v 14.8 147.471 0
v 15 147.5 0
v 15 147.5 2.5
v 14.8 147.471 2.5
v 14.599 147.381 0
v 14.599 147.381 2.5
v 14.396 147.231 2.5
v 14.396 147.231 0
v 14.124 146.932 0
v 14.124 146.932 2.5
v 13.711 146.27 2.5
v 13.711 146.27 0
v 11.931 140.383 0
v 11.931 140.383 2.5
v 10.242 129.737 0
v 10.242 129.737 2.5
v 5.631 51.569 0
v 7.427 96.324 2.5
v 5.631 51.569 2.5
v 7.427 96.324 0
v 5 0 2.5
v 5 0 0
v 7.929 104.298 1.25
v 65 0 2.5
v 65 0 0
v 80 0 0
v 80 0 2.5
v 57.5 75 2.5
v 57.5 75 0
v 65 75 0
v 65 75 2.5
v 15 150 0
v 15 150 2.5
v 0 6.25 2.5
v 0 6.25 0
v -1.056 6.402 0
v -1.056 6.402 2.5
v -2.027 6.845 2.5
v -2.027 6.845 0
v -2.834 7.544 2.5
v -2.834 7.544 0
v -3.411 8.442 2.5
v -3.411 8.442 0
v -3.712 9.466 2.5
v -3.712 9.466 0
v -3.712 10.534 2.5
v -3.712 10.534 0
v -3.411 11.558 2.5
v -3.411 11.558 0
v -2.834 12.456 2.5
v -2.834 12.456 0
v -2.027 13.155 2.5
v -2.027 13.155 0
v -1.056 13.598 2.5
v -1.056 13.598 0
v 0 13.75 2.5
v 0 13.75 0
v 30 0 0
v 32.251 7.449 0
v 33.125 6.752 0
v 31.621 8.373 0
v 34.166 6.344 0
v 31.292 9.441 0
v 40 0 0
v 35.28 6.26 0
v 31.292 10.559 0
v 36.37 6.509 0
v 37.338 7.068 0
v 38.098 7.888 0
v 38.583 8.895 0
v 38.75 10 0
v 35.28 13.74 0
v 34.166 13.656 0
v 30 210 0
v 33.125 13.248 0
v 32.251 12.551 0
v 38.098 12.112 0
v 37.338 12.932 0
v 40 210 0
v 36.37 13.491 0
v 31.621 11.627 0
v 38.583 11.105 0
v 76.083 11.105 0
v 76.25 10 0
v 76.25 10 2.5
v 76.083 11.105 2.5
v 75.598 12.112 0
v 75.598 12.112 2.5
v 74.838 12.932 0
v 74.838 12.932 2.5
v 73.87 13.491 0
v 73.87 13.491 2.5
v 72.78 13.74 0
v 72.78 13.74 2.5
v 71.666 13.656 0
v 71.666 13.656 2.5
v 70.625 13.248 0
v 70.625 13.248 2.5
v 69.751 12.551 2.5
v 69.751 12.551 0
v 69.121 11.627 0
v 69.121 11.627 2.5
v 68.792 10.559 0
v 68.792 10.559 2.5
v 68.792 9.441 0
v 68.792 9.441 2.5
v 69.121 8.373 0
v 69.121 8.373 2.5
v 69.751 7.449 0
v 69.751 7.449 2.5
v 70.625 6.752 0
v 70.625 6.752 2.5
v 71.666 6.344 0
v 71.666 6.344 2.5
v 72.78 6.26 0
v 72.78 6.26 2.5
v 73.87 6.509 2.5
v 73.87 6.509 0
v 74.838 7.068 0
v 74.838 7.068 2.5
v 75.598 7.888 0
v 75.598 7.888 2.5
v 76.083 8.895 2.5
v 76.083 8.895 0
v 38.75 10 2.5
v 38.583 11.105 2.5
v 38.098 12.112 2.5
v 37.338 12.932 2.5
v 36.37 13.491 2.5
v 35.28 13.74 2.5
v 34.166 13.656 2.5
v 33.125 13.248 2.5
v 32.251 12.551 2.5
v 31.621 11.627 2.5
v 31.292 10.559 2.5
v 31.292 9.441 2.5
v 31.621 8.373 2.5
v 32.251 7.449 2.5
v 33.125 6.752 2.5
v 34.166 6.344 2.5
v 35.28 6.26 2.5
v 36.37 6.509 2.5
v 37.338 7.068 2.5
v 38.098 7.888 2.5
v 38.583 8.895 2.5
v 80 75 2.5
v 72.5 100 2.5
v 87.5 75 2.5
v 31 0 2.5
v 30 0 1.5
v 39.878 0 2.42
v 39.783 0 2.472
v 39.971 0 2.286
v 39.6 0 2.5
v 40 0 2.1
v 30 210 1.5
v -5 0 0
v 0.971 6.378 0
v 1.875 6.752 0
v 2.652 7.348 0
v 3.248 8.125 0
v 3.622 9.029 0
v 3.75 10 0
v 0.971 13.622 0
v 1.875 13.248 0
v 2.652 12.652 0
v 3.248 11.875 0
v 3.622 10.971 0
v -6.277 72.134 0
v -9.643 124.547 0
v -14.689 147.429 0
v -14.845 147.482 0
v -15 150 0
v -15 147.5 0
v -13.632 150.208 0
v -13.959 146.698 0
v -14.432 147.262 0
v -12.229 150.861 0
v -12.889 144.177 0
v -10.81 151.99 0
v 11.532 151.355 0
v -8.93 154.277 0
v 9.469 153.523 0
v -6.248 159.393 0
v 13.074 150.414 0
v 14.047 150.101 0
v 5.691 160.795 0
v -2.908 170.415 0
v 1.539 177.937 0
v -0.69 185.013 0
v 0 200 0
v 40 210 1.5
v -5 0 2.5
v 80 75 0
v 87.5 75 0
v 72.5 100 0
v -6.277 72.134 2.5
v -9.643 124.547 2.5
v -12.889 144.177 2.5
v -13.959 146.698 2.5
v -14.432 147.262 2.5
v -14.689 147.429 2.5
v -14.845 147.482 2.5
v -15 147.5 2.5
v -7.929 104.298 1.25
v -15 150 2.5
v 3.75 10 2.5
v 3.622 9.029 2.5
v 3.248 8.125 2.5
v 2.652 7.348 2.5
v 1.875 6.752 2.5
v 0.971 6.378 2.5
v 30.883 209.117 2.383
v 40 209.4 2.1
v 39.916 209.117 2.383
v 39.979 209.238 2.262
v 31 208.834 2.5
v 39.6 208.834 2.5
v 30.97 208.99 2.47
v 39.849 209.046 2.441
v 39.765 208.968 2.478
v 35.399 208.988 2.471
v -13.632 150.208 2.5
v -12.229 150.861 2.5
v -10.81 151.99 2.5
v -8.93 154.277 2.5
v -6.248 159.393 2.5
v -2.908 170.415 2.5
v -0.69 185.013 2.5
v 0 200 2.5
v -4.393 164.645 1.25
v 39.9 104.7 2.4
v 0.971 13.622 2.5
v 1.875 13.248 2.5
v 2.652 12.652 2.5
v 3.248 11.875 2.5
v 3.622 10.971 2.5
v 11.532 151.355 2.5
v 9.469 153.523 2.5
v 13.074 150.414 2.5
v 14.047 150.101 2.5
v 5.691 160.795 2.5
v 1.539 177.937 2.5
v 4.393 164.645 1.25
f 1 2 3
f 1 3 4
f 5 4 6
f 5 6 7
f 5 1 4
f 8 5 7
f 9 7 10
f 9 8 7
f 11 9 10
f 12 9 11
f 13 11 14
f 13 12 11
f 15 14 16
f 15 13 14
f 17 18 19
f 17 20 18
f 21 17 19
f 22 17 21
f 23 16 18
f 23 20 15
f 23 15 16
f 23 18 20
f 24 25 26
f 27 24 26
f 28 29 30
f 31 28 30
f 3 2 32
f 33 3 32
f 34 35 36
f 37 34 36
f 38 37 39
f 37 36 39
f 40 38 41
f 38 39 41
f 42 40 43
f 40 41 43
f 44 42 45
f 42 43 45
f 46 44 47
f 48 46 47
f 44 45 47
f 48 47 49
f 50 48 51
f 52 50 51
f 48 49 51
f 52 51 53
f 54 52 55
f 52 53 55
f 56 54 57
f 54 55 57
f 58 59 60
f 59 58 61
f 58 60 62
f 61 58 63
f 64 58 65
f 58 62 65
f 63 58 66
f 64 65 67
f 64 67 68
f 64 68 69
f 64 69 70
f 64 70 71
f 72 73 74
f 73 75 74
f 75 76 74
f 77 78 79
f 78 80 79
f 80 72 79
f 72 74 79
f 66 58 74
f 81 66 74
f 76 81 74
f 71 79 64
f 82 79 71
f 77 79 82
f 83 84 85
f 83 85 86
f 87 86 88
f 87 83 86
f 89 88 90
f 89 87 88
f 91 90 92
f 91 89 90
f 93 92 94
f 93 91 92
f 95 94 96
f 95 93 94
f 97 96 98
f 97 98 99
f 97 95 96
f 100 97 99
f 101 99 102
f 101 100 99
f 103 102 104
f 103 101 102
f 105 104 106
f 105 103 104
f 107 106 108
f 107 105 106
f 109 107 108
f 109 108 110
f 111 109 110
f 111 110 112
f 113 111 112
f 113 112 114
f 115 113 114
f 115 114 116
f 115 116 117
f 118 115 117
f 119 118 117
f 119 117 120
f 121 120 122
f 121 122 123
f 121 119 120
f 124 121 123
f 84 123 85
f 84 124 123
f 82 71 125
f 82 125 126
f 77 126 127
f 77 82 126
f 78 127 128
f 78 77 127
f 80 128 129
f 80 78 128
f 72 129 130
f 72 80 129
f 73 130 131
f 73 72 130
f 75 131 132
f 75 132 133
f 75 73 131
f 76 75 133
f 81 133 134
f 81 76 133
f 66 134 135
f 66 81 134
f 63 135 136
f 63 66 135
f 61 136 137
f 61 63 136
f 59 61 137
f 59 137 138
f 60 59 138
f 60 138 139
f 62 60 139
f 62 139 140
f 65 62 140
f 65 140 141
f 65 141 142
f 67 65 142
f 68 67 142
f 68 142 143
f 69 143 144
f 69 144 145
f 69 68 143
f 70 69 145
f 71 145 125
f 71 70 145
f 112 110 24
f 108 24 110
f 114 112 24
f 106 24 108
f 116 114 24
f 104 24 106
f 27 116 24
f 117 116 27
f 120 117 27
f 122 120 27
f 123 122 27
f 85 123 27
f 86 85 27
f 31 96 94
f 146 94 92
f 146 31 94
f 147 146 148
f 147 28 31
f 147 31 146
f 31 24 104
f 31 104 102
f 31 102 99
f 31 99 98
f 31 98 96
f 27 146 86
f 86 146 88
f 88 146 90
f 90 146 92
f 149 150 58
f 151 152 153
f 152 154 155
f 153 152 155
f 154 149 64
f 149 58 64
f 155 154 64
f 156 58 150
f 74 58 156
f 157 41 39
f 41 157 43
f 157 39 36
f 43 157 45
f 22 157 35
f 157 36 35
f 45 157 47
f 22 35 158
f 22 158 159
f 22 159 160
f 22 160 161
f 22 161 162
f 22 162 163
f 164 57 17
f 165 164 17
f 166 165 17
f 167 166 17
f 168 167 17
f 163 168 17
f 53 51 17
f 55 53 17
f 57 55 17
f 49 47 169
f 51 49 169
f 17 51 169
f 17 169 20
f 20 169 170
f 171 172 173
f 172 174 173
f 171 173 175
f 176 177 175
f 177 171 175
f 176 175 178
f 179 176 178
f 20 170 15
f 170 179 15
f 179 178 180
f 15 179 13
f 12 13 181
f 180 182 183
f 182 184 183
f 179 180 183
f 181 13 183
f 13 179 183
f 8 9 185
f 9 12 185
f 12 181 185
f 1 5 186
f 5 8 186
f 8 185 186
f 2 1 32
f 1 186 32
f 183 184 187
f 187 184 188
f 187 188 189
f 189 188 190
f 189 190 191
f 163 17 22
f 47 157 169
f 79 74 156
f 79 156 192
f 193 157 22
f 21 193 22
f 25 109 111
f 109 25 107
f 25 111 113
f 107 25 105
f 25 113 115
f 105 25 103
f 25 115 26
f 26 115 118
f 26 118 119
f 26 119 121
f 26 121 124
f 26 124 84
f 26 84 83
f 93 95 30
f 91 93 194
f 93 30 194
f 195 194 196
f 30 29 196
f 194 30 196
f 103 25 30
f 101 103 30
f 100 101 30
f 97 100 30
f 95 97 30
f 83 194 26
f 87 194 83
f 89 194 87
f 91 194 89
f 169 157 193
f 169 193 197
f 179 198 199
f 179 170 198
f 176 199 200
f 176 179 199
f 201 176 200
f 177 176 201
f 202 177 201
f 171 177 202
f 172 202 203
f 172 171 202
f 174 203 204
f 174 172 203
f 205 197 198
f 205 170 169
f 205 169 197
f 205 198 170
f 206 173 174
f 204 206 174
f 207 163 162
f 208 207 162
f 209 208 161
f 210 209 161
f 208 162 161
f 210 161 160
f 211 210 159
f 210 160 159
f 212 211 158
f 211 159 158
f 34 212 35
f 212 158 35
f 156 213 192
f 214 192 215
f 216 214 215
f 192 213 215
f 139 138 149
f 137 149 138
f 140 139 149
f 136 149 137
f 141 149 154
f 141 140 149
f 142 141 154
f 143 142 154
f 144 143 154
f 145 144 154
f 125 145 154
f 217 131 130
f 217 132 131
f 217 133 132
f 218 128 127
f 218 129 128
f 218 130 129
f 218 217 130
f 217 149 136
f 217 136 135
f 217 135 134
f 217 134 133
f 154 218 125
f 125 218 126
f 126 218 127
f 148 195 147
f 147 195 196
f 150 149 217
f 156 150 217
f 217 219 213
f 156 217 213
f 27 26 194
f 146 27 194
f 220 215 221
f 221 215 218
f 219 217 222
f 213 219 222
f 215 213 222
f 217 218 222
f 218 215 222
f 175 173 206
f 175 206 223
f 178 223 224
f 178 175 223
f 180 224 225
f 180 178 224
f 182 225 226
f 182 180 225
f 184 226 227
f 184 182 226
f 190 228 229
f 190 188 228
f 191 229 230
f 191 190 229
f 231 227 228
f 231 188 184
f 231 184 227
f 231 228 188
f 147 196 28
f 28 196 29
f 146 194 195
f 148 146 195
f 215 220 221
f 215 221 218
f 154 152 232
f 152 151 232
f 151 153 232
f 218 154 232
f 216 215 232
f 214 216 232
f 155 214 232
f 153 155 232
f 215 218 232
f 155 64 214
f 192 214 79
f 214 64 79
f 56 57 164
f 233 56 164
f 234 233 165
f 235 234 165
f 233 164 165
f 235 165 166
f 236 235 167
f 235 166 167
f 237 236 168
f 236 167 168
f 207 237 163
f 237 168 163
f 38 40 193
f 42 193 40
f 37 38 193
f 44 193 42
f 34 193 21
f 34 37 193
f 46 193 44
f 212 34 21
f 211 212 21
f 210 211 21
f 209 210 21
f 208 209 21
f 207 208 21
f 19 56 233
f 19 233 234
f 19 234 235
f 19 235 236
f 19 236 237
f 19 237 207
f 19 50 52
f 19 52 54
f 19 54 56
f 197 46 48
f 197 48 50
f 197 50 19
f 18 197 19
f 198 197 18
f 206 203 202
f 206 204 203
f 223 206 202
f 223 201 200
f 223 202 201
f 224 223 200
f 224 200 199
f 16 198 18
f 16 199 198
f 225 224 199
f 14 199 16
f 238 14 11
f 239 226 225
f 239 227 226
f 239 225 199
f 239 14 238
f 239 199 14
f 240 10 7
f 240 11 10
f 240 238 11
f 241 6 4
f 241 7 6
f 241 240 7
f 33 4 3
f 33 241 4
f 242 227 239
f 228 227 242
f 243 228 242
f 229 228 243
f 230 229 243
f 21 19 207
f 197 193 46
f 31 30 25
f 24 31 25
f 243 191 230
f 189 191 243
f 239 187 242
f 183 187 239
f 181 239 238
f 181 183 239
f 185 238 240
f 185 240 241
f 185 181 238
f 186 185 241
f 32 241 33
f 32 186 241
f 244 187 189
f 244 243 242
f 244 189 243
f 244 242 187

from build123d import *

# Parameters (mm, degrees)
F0_W        = 10
F0_H        = 2.5
F1_DEPTH    = 2.5
F2_W        = 10
F2_H        = 210
F2_R        = 3.75
F3_DEPTH    = 2.5
F4_R        = 3.75
F5_DEPTH    = 2.5
F6_SIZE     = 1
F7_T1_DEPTH = 211
F7_T3_DEPTH = 9.8284271247


# Not quite as in the source:
# - a fillet or chamfer that OpenCascade refuses, or shapes differently, is made with other operations: its cross-section is extruded or revolved along the edge and cut away or added


with BuildPart() as f1:
    # F0 (on Top) → F1 (new body)
    with BuildSketch(Plane.XY):
        with BuildLine():
            Line((0, 6.25), (0, 0))
            Line((0, 0), (5, 0))
            add(Edge.make_bspline(
                [(15, 147.5), (5, 147.5), (5, 0)],
                knots=[3.1415926536, 3.1415926536, 3.1415926536, 4.7123889804, 4.7123889804, 4.7123889804], degree=2, weights=[1, 0.7071067812, 1]))
            Line((15, 147.5), (5, 147.5))
            Line((5, 147.5), (5, 150))
            Line((5, 150), (0, 150))
            Line((0, 150), (0, 13.75))
            ThreePointArc((0, 13.75), (2.6516504294, 12.6516504294), (3.75, 10))
            ThreePointArc((3.75, 10), (2.6516504294, 7.3483495706), (0, 6.25))
        make_face()
        with Locations((10, 148.75)):
            Rectangle(F0_W, F0_H)
        with BuildLine():
            Line((0, 200), (0, 150))
            Line((0, 150), (5, 150))
            Line((5, 150), (15, 150))
            add(Edge.make_bspline(
                [(0, 200), (0, 150), (15, 150)],
                knots=[4.7123889804, 4.7123889804, 4.7123889804, 6.2831853072, 6.2831853072, 6.2831853072], degree=2, weights=[1, 0.7071067812, 1]))
        make_face()
        with BuildLine():
            Line((-5, 0), (0, 0))
            Line((0, 0), (0, 6.25))
            ThreePointArc((0, 6.25), (-3.75, 10), (0, 13.75))
            Line((0, 13.75), (0, 150))
            Line((0, 150), (0, 200))
            add(Edge.make_bspline(
                [(-15, 150), (0, 150), (0, 200)],
                knots=[3.1415926536, 3.1415926536, 3.1415926536, 4.7123889804, 4.7123889804, 4.7123889804], degree=2, weights=[1, 0.7071067812, 1]))
            Line((-15, 150), (-15, 147.5))
            add(Edge.make_bspline(
                [(-5, 0), (-5, 147.5), (-15, 147.5)],
                knots=[1.5707963268, 1.5707963268, 1.5707963268, 3.1415926536, 3.1415926536, 3.1415926536], degree=2, weights=[1, 0.7071067812, 1]))
        make_face()
    extrude(amount=F1_DEPTH)


with BuildPart() as f3:
    # F2 (on Top) → F3 (new body)
    with BuildSketch(Plane.XY):
        with Locations((35, 105)):
            Rectangle(F2_W, F2_H)
        with Locations((35, 10)):
            Circle(F2_R, mode=Mode.SUBTRACT)
    extrude(amount=F3_DEPTH)

    # F6
    f6_edges = [f3.edges().sort_by_distance(p)[0] for p in [
        (35, 210, 2.5),
        (30, 105, 2.5),
    ]]
    chamfer(f6_edges, length=F6_SIZE)

    # F7: fillet of radius 0.4 on 2 edges, made by hand

    # F7_s2 → F7_t1 (cut)
    with BuildSketch(Plane.XZ.offset(-210)):
        with BuildLine():
            add(Edge.make_bspline(
                [(40, 2.1), (40, 2.5), (39.6, 2.5)],
                knots=[0, 0, 0, 1, 1, 1], degree=2, weights=[1, 1, 1]))
            Line((39.6, 2.5), (40, 2.5))
            Line((40, 2.5), (40, 2.1))
        make_face()
    extrude(amount=F7_T1_DEPTH, mode=Mode.SUBTRACT)

    # F7_s4 → F7_t3 (cut)
    with BuildSketch(Plane.YZ.offset(30.5857864376)):
        with BuildLine():
            add(Edge.make_bspline(
                [(209.1171572875, 2.3828427125), (209, 2.5), (208.8343145751, 2.5)],
                knots=[0, 0, 0, 1, 1, 1], degree=2, weights=[1, 1, 1]))
            Line((208.8343145751, 2.5), (209, 2.5))
            Line((209, 2.5), (209.1171572875, 2.3828427125))
        make_face()
    extrude(amount=F7_T3_DEPTH, mode=Mode.SUBTRACT)


with BuildPart() as f5:
    # F4 (on Top) → F5 (new body)
    with BuildSketch(Plane.XY):
        Polygon((65, 75), (65, 0), (80, 0), (80, 75), (87.5, 75), (72.5, 100), (57.5, 75), align=None)
        with Locations((72.5, 10)):
            Circle(F4_R, mode=Mode.SUBTRACT)
    extrude(amount=F5_DEPTH)


solid = Compound([f1.part, f3.part, f5.part])
